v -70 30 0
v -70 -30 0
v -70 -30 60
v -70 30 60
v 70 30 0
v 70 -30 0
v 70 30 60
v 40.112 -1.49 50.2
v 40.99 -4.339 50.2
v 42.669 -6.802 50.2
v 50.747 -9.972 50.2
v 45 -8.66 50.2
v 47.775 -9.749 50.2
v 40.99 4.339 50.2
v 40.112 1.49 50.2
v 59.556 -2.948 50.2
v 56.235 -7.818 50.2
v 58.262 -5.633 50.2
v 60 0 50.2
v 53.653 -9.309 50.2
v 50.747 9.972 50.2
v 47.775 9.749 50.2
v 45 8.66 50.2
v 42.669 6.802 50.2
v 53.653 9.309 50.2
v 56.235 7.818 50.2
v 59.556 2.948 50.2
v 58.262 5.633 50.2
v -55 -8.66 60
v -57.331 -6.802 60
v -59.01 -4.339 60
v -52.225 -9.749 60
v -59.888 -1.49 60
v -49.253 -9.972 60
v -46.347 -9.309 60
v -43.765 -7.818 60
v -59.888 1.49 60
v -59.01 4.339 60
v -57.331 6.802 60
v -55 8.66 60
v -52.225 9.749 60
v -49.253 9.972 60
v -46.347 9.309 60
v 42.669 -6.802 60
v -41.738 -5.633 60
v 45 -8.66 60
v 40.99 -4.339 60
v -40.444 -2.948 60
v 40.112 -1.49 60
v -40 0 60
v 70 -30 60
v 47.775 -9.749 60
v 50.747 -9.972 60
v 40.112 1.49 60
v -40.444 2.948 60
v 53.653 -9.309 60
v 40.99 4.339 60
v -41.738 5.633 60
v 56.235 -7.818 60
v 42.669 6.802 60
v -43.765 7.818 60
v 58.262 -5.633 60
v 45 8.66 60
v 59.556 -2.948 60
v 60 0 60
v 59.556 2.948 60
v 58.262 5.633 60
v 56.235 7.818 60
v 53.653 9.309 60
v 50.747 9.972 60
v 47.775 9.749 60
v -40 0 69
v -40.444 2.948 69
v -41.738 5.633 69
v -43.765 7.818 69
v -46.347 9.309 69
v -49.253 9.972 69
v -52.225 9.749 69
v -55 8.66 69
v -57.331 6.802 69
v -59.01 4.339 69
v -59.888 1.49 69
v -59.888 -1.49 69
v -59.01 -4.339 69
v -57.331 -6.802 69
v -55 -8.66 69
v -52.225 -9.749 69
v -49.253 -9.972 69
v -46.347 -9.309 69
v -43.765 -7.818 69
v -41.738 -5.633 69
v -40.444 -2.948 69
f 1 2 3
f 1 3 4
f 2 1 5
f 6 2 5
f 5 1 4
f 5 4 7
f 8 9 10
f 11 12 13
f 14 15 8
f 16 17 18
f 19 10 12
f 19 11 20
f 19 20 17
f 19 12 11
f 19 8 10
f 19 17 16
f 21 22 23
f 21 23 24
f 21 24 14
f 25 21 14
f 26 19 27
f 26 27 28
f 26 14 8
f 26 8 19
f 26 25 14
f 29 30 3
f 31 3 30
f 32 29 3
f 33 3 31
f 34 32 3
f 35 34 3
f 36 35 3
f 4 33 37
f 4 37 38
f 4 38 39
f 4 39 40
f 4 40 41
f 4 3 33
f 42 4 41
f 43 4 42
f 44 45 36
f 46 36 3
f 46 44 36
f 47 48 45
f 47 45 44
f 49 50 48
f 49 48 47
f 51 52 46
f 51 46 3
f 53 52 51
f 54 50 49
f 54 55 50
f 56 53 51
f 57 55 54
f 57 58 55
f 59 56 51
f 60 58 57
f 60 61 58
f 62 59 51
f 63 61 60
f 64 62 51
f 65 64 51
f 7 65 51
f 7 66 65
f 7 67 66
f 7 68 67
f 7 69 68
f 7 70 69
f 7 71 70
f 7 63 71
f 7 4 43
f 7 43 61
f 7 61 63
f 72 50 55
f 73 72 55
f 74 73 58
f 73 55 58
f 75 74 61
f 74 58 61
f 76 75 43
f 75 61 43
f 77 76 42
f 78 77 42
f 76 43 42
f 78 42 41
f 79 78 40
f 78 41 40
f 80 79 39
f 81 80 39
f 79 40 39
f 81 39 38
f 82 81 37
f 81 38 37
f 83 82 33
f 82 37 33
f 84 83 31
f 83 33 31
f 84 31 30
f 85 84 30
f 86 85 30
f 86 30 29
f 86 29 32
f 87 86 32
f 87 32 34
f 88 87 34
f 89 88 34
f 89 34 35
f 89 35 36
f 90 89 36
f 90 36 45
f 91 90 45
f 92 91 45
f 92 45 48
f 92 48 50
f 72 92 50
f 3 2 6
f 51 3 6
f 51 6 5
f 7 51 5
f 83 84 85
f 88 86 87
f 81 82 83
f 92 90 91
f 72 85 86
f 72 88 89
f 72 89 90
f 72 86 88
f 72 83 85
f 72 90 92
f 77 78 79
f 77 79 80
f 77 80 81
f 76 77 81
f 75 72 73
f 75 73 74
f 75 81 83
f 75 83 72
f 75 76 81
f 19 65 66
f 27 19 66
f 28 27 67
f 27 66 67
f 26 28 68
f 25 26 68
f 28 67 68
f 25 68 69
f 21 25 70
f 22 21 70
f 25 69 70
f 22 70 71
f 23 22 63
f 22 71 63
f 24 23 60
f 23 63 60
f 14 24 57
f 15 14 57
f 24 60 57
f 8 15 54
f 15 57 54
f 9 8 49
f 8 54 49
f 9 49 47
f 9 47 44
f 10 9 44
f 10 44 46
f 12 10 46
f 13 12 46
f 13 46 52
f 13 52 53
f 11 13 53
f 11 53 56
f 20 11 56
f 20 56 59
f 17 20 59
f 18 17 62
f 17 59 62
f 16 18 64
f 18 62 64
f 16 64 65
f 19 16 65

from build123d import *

# Parameters (mm, degrees)
F0_W     = 140
F0_H     = 60
F1_DEPTH = 60
F3_R     = 10
F5_DEPTH = 69
F4_R     = 10
F6_DEPTH = 9.8


with BuildPart() as f1:
    # F0 (on Top) → F1 (new body)
    with BuildSketch(Plane.XY):
        Rectangle(F0_W, F0_H)
    extrude(amount=F1_DEPTH)

    # F3 (on Top) → F5 (join)
    with BuildSketch(Plane.XY):
        with Locations((-50, 0)):
            Circle(F3_R)
    extrude(amount=F5_DEPTH)

    # F4 (on face) → F6 (cut)
    with BuildSketch(Plane.XY.offset(60)):
        with Locations((50, 0)):
            Circle(F4_R)
    extrude(amount=-F6_DEPTH, mode=Mode.SUBTRACT)


solid = f1.part
